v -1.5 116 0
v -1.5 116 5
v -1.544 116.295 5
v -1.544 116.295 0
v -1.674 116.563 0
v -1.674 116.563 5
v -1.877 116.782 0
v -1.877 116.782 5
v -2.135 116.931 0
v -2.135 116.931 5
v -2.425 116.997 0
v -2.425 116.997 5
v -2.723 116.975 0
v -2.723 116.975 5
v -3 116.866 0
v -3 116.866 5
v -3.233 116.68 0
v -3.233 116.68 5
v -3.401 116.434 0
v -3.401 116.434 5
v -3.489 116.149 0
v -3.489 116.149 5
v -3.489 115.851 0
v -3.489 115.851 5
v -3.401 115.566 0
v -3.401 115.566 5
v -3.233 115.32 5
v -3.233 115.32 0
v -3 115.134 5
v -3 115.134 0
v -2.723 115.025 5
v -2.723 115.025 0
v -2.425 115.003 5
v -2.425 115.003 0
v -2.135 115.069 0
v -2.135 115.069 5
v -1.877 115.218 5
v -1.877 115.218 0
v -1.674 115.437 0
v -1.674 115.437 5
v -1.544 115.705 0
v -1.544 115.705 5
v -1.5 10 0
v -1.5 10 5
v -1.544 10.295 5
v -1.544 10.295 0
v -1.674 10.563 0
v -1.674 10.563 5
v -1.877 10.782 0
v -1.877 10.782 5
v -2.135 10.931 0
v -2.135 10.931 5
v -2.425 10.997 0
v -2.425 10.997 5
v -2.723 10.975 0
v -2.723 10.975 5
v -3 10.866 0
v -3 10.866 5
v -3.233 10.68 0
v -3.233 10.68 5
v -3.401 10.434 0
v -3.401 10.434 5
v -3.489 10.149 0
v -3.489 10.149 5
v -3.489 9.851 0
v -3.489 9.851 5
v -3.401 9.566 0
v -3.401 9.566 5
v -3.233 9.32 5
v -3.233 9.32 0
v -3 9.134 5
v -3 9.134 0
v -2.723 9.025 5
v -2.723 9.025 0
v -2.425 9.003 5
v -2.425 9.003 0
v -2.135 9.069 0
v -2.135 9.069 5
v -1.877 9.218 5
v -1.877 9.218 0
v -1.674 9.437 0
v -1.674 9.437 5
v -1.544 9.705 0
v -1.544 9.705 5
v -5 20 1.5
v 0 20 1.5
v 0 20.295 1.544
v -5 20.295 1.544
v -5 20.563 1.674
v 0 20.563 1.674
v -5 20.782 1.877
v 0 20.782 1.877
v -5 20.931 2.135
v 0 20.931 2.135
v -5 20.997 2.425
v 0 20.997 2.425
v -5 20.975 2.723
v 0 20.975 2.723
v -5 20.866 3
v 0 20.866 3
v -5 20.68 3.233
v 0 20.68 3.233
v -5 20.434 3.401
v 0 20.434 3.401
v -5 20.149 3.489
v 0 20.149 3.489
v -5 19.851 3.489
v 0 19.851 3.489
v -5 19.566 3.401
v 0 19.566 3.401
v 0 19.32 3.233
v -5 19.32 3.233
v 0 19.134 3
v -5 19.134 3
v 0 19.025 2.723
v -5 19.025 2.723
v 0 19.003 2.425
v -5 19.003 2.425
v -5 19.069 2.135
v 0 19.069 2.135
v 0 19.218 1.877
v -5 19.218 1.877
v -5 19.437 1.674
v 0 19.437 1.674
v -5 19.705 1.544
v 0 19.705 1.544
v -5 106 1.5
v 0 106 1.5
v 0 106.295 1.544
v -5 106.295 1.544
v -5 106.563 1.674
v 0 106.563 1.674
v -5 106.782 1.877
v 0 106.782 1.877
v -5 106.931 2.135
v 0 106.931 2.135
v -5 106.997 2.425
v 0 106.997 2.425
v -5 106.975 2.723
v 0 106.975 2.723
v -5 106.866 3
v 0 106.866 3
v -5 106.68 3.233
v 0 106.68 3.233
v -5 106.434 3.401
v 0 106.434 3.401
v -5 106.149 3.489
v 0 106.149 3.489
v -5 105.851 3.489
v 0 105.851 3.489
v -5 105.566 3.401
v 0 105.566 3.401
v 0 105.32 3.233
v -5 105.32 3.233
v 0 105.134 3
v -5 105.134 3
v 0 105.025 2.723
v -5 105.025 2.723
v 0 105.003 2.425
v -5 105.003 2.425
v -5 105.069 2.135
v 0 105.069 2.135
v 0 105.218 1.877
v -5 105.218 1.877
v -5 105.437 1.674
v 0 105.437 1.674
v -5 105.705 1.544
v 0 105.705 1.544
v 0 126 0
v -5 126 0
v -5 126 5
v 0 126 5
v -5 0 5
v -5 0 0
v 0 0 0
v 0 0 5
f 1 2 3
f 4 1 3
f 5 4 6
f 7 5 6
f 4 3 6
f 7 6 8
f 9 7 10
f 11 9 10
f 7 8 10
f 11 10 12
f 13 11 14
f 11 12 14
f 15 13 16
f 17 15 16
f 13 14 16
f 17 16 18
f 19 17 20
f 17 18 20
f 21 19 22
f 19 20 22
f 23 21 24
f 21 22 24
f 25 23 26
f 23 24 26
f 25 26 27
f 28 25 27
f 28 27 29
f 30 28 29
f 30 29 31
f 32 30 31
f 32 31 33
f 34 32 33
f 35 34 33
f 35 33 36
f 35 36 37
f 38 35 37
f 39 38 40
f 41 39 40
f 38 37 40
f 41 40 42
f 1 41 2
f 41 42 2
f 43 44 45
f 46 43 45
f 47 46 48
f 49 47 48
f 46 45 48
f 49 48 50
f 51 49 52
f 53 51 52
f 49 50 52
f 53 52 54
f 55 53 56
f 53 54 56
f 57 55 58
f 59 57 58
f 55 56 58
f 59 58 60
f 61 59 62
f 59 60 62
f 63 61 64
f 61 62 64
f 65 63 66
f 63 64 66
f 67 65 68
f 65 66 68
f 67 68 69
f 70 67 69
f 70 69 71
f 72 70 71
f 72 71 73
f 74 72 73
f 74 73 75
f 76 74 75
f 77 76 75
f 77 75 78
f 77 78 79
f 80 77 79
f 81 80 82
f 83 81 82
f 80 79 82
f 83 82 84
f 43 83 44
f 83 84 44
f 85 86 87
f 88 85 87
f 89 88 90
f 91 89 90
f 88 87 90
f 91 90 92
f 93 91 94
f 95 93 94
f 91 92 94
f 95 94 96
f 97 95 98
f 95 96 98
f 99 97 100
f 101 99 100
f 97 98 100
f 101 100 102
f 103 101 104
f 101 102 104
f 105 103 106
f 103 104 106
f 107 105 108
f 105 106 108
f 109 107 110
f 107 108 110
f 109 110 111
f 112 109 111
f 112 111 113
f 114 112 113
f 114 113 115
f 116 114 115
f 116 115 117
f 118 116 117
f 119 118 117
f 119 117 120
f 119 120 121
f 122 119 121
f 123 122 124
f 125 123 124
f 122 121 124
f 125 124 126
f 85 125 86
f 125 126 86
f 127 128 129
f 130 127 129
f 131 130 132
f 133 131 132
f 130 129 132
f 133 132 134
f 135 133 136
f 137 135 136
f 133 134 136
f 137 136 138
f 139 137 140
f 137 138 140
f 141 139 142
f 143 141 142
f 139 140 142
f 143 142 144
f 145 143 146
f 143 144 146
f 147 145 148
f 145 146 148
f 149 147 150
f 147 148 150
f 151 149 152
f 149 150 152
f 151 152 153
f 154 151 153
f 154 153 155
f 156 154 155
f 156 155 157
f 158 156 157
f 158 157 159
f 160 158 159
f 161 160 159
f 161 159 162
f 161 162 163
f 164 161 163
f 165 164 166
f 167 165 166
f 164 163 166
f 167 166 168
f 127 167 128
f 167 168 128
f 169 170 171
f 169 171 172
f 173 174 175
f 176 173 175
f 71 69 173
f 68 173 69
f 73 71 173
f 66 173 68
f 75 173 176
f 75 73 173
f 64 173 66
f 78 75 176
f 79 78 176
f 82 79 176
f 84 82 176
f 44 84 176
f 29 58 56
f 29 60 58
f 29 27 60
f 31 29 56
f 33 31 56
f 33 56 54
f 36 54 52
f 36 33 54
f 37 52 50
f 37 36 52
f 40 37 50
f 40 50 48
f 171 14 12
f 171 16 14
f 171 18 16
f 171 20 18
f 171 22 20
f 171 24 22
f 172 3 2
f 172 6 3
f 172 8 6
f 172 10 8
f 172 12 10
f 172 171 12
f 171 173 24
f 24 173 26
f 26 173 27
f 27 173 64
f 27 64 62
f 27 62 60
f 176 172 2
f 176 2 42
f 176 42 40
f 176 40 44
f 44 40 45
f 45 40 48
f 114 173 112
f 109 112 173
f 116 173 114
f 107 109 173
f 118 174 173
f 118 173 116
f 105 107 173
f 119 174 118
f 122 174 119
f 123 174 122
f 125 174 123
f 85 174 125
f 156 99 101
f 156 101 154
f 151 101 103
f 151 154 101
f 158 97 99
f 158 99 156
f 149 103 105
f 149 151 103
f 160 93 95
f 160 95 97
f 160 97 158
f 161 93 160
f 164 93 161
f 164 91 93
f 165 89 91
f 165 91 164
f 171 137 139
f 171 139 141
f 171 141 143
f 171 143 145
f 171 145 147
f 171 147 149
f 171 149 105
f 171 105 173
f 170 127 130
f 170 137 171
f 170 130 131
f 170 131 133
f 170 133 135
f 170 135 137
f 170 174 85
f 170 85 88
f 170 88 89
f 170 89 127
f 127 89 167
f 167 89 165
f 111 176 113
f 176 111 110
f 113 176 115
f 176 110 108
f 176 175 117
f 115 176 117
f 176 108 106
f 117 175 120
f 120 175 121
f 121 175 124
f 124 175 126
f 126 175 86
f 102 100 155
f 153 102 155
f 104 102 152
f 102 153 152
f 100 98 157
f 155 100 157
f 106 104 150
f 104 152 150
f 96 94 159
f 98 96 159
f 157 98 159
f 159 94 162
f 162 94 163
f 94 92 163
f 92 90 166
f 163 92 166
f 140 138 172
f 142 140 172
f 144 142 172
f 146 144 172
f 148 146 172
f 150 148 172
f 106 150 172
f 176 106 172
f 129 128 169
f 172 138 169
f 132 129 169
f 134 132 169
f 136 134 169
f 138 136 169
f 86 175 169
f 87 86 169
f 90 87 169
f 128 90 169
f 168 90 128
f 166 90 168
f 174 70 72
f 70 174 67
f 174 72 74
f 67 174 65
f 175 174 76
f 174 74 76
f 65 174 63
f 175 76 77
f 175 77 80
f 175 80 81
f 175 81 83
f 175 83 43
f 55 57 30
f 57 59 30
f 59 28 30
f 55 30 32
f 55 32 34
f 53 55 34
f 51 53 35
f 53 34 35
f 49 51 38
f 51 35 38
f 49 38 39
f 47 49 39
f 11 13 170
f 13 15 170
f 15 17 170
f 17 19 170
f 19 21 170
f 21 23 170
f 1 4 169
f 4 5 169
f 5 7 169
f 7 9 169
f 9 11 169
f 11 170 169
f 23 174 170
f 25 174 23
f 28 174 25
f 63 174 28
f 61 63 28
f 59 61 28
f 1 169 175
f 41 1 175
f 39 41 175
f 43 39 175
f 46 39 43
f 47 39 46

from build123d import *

# Parameters (mm, degrees)
SKETCH_1_W          = 5
SKETCH_1_H          = 126
EXTRUDE_1_DEPTH     = 5
SKETCH_2_R          = 1
CUT_EXTRUDE_1_DEPTH = 5
SKETCH_3_R          = 1
CUT_EXTRUDE_2_DEPTH = 5


with BuildPart() as part:
    # 草图1 → 凸台-拉伸1 (new body)
    with BuildSketch(Plane.XY):
        with Locations((-2.5, 63)):
            Rectangle(SKETCH_1_W, SKETCH_1_H)
    extrude(amount=EXTRUDE_1_DEPTH)

    # 草图2 → 切除-拉伸1 (cut)
    with BuildSketch(Plane.XY.offset(5)):
        with Locations((-2.5, 116)):
            Circle(SKETCH_2_R)
        with Locations((-2.5, 10)):
            Circle(SKETCH_2_R)
    extrude(amount=-CUT_EXTRUDE_1_DEPTH, mode=Mode.SUBTRACT)

    # 草图3 → 切除-拉伸2 (cut)
    with BuildSketch(Plane(origin=(0, 0, 0), x_dir=(0, 0, -1), z_dir=(1, 0, 0))):
        with Locations((-2.5, 106)):
            Circle(SKETCH_3_R)
        with Locations((-2.5, 20)):
            Circle(SKETCH_3_R)
    extrude(amount=-CUT_EXTRUDE_2_DEPTH, mode=Mode.SUBTRACT)


solid = part.part
